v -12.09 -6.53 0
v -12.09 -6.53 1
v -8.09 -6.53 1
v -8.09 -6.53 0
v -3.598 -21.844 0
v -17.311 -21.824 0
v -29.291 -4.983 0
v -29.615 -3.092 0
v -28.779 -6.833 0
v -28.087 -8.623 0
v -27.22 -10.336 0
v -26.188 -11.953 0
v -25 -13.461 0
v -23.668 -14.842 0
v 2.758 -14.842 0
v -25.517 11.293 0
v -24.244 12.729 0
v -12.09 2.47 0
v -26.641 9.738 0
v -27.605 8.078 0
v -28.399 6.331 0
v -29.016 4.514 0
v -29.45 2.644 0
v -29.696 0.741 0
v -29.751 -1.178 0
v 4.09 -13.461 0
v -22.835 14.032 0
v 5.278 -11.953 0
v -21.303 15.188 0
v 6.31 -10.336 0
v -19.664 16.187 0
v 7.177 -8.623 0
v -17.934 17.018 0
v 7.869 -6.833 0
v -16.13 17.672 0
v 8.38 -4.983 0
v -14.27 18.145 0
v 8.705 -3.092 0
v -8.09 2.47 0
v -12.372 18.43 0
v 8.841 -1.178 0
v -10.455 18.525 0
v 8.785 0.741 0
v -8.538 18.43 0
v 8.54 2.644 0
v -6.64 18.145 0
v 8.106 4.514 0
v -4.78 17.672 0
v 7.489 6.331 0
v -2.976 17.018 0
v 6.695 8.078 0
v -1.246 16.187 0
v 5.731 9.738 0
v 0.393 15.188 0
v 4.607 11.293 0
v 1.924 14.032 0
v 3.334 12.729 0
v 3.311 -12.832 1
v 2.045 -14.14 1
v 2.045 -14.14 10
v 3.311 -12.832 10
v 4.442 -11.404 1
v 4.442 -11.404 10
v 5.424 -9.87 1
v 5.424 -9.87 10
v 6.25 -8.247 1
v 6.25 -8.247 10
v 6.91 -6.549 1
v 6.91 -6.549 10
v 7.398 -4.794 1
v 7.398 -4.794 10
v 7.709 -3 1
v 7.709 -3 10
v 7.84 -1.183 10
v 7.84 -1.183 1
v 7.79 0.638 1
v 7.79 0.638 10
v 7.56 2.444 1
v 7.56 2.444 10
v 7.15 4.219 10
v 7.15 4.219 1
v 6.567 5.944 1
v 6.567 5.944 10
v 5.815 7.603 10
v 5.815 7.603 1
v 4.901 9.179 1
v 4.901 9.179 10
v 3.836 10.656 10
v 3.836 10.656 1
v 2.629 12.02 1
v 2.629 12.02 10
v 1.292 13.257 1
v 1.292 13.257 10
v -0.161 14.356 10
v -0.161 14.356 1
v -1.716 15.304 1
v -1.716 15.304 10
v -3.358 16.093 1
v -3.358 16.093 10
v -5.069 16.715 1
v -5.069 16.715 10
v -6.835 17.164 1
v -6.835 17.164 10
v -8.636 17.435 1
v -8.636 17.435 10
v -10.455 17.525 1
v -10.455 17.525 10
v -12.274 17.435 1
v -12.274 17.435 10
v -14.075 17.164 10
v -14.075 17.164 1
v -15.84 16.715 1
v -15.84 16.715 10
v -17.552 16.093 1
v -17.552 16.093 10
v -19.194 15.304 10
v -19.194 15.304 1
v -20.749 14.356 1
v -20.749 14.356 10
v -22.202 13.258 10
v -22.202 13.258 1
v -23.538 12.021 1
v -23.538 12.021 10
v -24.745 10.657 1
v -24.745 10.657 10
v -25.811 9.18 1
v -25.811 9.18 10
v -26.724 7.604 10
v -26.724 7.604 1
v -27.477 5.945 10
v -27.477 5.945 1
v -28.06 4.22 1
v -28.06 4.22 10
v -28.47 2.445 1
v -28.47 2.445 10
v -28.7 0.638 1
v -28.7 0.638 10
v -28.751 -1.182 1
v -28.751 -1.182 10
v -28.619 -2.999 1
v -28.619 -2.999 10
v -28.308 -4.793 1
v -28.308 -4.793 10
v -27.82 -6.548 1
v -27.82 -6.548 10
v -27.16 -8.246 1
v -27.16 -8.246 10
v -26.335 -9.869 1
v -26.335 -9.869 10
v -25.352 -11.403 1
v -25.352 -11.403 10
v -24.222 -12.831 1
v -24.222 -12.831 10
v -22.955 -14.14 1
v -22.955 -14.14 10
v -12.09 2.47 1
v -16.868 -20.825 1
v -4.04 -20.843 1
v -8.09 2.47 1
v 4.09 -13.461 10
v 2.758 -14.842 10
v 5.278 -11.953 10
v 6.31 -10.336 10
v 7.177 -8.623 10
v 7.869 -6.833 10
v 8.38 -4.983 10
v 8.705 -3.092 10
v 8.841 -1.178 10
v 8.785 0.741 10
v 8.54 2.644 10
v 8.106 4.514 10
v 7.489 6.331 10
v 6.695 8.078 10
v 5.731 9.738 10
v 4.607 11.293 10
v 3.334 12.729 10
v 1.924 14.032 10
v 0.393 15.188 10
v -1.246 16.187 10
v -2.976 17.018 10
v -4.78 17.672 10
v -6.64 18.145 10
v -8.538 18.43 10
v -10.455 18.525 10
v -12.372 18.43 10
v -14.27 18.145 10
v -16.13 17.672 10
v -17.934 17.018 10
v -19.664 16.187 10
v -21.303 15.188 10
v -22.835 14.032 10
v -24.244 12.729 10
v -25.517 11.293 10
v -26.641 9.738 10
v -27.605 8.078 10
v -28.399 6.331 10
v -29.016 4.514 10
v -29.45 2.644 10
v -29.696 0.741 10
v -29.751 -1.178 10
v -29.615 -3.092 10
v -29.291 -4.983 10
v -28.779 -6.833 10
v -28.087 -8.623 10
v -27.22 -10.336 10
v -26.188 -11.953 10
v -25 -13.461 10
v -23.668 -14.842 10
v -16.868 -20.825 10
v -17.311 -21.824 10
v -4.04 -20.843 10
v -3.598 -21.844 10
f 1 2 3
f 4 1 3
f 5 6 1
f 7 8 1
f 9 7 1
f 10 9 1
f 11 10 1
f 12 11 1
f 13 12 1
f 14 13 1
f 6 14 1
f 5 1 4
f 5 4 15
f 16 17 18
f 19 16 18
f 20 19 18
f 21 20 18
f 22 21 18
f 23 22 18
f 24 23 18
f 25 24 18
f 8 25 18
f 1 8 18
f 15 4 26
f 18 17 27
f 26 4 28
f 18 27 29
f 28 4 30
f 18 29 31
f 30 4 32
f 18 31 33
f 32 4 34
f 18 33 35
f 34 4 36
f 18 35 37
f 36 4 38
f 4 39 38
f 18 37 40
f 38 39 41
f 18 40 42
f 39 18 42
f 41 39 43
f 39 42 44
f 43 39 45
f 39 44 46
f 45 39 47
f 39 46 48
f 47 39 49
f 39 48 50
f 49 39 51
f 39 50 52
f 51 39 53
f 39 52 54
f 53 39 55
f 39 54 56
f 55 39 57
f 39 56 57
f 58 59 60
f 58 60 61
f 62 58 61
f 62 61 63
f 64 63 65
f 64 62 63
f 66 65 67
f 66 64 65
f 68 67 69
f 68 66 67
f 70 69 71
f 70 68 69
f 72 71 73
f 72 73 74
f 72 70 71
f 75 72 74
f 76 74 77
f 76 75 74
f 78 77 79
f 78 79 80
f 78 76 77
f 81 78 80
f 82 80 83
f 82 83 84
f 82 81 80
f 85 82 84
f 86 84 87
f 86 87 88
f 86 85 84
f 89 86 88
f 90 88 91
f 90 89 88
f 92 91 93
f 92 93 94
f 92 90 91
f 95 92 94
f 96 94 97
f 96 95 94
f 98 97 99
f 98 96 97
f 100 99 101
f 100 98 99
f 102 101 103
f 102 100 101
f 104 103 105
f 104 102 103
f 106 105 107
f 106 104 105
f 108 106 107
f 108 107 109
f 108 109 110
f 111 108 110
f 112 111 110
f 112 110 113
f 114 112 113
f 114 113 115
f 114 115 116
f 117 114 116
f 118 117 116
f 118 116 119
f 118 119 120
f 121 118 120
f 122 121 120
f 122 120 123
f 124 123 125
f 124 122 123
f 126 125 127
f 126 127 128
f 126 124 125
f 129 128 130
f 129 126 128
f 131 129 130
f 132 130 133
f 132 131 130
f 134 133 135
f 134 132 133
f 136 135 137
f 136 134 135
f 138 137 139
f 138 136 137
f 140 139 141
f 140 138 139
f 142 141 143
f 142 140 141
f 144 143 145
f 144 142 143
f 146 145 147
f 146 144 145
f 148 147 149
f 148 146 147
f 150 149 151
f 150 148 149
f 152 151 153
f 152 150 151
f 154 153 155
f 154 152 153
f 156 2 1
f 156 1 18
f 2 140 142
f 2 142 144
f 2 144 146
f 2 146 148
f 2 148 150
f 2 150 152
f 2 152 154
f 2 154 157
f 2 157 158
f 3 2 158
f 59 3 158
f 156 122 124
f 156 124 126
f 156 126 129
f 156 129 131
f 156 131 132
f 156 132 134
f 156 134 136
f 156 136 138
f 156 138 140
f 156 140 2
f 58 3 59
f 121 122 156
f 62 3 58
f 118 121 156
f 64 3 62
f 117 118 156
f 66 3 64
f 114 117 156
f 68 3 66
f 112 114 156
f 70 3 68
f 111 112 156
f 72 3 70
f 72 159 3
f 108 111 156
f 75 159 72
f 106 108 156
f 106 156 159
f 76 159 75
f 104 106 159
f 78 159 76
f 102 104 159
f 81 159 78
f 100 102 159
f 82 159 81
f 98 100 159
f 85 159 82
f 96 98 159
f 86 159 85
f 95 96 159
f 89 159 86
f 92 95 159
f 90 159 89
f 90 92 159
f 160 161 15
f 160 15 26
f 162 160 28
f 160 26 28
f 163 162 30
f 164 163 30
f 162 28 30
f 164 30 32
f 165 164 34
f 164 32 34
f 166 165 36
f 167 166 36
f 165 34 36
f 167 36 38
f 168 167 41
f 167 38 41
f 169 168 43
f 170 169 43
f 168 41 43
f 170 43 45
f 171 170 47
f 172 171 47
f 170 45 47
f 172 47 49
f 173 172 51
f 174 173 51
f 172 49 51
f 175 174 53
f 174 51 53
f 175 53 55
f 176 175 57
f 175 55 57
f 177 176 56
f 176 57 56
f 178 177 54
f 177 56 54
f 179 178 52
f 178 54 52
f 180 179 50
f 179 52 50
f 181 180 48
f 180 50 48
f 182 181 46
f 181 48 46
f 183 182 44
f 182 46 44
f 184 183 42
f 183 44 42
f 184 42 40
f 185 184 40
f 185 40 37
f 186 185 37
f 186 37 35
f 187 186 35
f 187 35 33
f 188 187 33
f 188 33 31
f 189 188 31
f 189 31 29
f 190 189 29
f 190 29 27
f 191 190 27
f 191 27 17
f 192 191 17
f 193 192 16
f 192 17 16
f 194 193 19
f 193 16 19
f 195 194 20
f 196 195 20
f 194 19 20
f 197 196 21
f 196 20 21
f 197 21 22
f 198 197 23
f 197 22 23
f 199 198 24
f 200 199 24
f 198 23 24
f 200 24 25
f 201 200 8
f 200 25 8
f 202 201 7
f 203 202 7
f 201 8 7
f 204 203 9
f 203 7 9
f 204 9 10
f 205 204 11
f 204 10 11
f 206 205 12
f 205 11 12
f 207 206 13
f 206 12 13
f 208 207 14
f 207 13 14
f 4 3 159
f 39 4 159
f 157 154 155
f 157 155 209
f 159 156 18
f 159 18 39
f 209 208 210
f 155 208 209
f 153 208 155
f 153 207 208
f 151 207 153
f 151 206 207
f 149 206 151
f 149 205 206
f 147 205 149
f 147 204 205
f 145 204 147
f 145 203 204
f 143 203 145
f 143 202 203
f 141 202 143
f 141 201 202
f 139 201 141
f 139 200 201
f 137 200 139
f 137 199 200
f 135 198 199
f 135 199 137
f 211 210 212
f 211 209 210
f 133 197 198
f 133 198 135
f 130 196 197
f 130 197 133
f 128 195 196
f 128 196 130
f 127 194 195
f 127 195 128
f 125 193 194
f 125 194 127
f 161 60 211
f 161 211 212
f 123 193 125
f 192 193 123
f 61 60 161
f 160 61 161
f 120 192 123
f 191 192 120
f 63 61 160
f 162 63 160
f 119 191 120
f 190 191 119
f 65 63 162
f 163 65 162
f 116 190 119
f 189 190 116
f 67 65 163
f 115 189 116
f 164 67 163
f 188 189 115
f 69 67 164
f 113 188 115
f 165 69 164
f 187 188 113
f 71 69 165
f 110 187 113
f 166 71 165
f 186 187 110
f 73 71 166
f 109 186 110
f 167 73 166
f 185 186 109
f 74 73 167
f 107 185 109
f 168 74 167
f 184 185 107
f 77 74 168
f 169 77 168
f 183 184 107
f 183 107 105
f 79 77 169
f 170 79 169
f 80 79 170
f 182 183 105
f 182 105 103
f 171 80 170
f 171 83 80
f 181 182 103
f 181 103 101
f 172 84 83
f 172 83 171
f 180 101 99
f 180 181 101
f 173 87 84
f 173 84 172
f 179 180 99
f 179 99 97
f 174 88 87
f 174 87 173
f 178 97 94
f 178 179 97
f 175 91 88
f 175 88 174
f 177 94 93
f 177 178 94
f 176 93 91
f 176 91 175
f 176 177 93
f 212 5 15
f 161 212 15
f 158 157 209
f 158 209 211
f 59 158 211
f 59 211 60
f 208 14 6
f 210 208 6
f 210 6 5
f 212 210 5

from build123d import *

# Parameters (mm, degrees)
BOSS_EXTRUDE1_DEPTH = 10
SHELL1_START        = 1
SHELL1_DEPTH        = 9
CUT_EXTRUDE1_REACH  = 40.243
SKETCH2_W           = 4
SKETCH2_H           = 9


# Read off the part's stored shape, not the designer's step: Shell1
with BuildPart() as part:
    # Sketch1 → Boss-Extrude1 (new body)
    with BuildSketch(Plane.XY):
        with BuildLine():
            Line((-17.310520711, -21.823889376), (-3.597740248, -21.843555797))
            Line((-3.597740248, -21.843555797), (2.757908107, -14.842465178))
            ThreePointArc((2.757908107, -14.842465178), (-10.455115829, 18.525441507), (-23.668139764, -14.842465178))
            Line((-23.668139764, -14.842465178), (-17.310520711, -21.823889376))
        make_face()
    extrude(amount=BOSS_EXTRUDE1_DEPTH)

    # Shell1 outline → Shell1 (cut)
    with BuildSketch(Plane.XY.offset(SHELL1_START)):
        with BuildLine():
            Line((-4.039953619, -20.84292056), (2.044621953, -14.140431281))
            ThreePointArc((2.044621953, -14.140431281), (-10.45473176, 17.525441503), (-22.955414629, -14.139906596))
            Line((-22.955414629, -14.139906596), (-16.868083072, -20.824522877))
            Line((-16.868083072, -20.824522877), (-4.039953619, -20.84292056))
        make_face()
    extrude(amount=SHELL1_DEPTH, mode=Mode.SUBTRACT)

    # Sketch2 → Cut-Extrude1 (cut, up to next)
    with BuildSketch(Plane.XY.offset(10), mode=Mode.PRIVATE) as cut_extrude1_sk1:
        with Locations((-10.090473375, -2.029514736)):
            Rectangle(SKETCH2_W, SKETCH2_H)
    cut_extrude1_tool1 = extrude(cut_extrude1_sk1.sketch, amount=-CUT_EXTRUDE1_REACH, mode=Mode.PRIVATE) & part.part
    add(cut_extrude1_tool1.solids().sort_by_distance((-10.090473, -2.029515, 10))[0], mode=Mode.SUBTRACT)


solid = part.part
